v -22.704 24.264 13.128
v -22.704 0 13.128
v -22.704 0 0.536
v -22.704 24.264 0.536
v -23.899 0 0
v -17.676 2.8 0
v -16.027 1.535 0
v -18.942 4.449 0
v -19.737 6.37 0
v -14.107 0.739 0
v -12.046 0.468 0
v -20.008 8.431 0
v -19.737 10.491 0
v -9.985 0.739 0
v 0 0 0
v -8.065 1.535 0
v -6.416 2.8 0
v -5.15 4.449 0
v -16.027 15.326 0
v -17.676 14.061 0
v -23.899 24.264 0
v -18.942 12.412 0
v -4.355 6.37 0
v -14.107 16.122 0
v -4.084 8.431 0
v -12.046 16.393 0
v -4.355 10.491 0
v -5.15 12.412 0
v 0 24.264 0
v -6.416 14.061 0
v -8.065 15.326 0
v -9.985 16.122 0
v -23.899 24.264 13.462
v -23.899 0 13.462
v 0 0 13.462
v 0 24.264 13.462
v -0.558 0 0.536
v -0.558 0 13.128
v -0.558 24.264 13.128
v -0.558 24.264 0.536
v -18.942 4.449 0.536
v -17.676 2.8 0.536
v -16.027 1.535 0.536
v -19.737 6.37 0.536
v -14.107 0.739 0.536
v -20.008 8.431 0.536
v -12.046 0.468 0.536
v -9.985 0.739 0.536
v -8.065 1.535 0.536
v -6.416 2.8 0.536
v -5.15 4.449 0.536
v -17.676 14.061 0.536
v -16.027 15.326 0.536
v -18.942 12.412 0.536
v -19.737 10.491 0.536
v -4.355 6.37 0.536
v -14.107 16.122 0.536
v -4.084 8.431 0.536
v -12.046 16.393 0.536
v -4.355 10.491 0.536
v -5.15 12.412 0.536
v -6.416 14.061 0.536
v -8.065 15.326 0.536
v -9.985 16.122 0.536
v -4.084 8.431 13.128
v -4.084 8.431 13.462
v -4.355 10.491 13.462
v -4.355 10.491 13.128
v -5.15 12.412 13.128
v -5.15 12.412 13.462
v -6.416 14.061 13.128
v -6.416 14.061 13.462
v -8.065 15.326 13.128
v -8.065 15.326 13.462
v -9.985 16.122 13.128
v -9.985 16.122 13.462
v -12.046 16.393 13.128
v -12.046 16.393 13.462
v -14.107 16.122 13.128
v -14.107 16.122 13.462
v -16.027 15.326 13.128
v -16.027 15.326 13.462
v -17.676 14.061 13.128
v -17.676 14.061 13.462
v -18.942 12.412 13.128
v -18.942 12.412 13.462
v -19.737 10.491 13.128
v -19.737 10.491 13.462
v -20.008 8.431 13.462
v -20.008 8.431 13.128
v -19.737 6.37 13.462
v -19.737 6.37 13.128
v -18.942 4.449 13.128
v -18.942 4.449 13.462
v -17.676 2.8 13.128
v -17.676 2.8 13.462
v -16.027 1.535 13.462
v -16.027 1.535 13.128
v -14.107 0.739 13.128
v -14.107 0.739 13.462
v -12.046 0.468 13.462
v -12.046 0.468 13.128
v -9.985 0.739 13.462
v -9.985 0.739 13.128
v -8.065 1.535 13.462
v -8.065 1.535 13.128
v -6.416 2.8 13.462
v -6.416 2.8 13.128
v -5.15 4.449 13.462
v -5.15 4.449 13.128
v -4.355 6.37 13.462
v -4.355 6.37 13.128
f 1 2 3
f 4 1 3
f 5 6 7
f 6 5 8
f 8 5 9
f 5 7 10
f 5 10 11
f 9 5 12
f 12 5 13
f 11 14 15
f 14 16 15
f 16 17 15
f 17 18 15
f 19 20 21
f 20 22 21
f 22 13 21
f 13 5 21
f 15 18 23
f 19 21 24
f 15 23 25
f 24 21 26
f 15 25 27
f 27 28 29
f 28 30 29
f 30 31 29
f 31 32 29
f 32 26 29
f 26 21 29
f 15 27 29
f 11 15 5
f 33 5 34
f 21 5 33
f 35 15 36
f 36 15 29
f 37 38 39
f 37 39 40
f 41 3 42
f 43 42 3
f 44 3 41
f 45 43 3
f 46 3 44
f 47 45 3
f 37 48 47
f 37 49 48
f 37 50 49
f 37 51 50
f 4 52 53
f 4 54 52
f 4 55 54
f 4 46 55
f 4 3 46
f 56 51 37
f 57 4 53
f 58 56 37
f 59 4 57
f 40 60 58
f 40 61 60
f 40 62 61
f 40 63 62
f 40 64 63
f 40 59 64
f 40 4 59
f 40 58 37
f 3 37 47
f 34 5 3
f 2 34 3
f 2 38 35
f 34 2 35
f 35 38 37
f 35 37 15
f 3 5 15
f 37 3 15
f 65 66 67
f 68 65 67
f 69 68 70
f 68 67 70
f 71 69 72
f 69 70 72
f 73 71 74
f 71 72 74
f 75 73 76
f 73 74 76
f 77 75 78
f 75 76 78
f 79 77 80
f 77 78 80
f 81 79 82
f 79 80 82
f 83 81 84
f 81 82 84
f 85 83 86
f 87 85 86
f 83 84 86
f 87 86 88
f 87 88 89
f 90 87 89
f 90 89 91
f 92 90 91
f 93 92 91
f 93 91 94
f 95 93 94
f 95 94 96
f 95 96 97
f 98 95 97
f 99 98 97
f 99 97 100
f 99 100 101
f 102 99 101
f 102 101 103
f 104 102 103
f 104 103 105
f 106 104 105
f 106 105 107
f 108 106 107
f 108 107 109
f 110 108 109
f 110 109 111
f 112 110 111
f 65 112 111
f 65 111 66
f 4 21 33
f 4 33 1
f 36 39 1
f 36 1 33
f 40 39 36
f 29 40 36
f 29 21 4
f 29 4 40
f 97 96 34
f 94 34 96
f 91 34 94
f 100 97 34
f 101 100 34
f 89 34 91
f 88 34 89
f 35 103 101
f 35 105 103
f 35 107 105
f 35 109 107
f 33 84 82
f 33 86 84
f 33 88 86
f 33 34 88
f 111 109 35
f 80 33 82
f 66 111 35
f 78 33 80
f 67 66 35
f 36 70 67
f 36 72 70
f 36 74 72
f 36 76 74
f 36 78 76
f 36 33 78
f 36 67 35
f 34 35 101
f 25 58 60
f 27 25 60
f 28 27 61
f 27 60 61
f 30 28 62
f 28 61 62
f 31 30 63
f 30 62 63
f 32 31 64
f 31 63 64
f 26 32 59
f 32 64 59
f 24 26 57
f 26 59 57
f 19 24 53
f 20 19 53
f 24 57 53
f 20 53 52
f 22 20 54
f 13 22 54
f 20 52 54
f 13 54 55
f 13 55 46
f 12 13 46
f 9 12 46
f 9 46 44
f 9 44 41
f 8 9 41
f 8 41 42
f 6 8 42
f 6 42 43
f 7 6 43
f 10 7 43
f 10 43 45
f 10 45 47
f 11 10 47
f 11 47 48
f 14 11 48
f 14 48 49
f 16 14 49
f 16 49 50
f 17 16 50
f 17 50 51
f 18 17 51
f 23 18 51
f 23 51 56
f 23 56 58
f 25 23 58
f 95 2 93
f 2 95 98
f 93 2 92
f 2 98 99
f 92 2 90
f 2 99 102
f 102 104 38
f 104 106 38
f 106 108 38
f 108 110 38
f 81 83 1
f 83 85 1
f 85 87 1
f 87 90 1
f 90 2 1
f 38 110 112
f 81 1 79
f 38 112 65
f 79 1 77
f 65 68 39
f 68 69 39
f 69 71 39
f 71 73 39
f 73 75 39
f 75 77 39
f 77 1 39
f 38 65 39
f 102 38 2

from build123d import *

# Parameters (mm, degrees)
SKETCH1_W           = 23.898976307
SKETCH1_H           = 24.263846175
BOSS_EXTRUDE3_DEPTH = 13.462
SKETCH2_R           = 7.962435276
CUT_EXTRUDE1_DEPTH  = 35.56
SKETCH3_W           = 22.145451027
SKETCH3_H           = 12.591550695
CUT_EXTRUDE2_DEPTH  = 167.64


with BuildPart() as part:
    # Sketch1 → Boss-Extrude3 (new body)
    with BuildSketch(Plane.XY):
        with Locations((-11.949488154, 12.131923088)):
            Rectangle(SKETCH1_W, SKETCH1_H)
    extrude(amount=BOSS_EXTRUDE3_DEPTH)

    # Sketch2 → Cut-Extrude1 (cut)
    with BuildSketch(Plane.XY.offset(13.462)):
        with Locations((-12.046046864, 8.430505839)):
            Circle(SKETCH2_R)
    extrude(amount=-CUT_EXTRUDE1_DEPTH, mode=Mode.SUBTRACT)

    # Sketch3 → Cut-Extrude2 (cut)
    with BuildSketch(Plane(origin=(0, 24.263846175, 0), x_dir=(1, 0, 0), z_dir=(0, 1, 0))):
        with Locations((-11.63102481, -6.83187996)):
            Rectangle(SKETCH3_W, SKETCH3_H)
    extrude(amount=-CUT_EXTRUDE2_DEPTH, mode=Mode.SUBTRACT)


solid = part.part
